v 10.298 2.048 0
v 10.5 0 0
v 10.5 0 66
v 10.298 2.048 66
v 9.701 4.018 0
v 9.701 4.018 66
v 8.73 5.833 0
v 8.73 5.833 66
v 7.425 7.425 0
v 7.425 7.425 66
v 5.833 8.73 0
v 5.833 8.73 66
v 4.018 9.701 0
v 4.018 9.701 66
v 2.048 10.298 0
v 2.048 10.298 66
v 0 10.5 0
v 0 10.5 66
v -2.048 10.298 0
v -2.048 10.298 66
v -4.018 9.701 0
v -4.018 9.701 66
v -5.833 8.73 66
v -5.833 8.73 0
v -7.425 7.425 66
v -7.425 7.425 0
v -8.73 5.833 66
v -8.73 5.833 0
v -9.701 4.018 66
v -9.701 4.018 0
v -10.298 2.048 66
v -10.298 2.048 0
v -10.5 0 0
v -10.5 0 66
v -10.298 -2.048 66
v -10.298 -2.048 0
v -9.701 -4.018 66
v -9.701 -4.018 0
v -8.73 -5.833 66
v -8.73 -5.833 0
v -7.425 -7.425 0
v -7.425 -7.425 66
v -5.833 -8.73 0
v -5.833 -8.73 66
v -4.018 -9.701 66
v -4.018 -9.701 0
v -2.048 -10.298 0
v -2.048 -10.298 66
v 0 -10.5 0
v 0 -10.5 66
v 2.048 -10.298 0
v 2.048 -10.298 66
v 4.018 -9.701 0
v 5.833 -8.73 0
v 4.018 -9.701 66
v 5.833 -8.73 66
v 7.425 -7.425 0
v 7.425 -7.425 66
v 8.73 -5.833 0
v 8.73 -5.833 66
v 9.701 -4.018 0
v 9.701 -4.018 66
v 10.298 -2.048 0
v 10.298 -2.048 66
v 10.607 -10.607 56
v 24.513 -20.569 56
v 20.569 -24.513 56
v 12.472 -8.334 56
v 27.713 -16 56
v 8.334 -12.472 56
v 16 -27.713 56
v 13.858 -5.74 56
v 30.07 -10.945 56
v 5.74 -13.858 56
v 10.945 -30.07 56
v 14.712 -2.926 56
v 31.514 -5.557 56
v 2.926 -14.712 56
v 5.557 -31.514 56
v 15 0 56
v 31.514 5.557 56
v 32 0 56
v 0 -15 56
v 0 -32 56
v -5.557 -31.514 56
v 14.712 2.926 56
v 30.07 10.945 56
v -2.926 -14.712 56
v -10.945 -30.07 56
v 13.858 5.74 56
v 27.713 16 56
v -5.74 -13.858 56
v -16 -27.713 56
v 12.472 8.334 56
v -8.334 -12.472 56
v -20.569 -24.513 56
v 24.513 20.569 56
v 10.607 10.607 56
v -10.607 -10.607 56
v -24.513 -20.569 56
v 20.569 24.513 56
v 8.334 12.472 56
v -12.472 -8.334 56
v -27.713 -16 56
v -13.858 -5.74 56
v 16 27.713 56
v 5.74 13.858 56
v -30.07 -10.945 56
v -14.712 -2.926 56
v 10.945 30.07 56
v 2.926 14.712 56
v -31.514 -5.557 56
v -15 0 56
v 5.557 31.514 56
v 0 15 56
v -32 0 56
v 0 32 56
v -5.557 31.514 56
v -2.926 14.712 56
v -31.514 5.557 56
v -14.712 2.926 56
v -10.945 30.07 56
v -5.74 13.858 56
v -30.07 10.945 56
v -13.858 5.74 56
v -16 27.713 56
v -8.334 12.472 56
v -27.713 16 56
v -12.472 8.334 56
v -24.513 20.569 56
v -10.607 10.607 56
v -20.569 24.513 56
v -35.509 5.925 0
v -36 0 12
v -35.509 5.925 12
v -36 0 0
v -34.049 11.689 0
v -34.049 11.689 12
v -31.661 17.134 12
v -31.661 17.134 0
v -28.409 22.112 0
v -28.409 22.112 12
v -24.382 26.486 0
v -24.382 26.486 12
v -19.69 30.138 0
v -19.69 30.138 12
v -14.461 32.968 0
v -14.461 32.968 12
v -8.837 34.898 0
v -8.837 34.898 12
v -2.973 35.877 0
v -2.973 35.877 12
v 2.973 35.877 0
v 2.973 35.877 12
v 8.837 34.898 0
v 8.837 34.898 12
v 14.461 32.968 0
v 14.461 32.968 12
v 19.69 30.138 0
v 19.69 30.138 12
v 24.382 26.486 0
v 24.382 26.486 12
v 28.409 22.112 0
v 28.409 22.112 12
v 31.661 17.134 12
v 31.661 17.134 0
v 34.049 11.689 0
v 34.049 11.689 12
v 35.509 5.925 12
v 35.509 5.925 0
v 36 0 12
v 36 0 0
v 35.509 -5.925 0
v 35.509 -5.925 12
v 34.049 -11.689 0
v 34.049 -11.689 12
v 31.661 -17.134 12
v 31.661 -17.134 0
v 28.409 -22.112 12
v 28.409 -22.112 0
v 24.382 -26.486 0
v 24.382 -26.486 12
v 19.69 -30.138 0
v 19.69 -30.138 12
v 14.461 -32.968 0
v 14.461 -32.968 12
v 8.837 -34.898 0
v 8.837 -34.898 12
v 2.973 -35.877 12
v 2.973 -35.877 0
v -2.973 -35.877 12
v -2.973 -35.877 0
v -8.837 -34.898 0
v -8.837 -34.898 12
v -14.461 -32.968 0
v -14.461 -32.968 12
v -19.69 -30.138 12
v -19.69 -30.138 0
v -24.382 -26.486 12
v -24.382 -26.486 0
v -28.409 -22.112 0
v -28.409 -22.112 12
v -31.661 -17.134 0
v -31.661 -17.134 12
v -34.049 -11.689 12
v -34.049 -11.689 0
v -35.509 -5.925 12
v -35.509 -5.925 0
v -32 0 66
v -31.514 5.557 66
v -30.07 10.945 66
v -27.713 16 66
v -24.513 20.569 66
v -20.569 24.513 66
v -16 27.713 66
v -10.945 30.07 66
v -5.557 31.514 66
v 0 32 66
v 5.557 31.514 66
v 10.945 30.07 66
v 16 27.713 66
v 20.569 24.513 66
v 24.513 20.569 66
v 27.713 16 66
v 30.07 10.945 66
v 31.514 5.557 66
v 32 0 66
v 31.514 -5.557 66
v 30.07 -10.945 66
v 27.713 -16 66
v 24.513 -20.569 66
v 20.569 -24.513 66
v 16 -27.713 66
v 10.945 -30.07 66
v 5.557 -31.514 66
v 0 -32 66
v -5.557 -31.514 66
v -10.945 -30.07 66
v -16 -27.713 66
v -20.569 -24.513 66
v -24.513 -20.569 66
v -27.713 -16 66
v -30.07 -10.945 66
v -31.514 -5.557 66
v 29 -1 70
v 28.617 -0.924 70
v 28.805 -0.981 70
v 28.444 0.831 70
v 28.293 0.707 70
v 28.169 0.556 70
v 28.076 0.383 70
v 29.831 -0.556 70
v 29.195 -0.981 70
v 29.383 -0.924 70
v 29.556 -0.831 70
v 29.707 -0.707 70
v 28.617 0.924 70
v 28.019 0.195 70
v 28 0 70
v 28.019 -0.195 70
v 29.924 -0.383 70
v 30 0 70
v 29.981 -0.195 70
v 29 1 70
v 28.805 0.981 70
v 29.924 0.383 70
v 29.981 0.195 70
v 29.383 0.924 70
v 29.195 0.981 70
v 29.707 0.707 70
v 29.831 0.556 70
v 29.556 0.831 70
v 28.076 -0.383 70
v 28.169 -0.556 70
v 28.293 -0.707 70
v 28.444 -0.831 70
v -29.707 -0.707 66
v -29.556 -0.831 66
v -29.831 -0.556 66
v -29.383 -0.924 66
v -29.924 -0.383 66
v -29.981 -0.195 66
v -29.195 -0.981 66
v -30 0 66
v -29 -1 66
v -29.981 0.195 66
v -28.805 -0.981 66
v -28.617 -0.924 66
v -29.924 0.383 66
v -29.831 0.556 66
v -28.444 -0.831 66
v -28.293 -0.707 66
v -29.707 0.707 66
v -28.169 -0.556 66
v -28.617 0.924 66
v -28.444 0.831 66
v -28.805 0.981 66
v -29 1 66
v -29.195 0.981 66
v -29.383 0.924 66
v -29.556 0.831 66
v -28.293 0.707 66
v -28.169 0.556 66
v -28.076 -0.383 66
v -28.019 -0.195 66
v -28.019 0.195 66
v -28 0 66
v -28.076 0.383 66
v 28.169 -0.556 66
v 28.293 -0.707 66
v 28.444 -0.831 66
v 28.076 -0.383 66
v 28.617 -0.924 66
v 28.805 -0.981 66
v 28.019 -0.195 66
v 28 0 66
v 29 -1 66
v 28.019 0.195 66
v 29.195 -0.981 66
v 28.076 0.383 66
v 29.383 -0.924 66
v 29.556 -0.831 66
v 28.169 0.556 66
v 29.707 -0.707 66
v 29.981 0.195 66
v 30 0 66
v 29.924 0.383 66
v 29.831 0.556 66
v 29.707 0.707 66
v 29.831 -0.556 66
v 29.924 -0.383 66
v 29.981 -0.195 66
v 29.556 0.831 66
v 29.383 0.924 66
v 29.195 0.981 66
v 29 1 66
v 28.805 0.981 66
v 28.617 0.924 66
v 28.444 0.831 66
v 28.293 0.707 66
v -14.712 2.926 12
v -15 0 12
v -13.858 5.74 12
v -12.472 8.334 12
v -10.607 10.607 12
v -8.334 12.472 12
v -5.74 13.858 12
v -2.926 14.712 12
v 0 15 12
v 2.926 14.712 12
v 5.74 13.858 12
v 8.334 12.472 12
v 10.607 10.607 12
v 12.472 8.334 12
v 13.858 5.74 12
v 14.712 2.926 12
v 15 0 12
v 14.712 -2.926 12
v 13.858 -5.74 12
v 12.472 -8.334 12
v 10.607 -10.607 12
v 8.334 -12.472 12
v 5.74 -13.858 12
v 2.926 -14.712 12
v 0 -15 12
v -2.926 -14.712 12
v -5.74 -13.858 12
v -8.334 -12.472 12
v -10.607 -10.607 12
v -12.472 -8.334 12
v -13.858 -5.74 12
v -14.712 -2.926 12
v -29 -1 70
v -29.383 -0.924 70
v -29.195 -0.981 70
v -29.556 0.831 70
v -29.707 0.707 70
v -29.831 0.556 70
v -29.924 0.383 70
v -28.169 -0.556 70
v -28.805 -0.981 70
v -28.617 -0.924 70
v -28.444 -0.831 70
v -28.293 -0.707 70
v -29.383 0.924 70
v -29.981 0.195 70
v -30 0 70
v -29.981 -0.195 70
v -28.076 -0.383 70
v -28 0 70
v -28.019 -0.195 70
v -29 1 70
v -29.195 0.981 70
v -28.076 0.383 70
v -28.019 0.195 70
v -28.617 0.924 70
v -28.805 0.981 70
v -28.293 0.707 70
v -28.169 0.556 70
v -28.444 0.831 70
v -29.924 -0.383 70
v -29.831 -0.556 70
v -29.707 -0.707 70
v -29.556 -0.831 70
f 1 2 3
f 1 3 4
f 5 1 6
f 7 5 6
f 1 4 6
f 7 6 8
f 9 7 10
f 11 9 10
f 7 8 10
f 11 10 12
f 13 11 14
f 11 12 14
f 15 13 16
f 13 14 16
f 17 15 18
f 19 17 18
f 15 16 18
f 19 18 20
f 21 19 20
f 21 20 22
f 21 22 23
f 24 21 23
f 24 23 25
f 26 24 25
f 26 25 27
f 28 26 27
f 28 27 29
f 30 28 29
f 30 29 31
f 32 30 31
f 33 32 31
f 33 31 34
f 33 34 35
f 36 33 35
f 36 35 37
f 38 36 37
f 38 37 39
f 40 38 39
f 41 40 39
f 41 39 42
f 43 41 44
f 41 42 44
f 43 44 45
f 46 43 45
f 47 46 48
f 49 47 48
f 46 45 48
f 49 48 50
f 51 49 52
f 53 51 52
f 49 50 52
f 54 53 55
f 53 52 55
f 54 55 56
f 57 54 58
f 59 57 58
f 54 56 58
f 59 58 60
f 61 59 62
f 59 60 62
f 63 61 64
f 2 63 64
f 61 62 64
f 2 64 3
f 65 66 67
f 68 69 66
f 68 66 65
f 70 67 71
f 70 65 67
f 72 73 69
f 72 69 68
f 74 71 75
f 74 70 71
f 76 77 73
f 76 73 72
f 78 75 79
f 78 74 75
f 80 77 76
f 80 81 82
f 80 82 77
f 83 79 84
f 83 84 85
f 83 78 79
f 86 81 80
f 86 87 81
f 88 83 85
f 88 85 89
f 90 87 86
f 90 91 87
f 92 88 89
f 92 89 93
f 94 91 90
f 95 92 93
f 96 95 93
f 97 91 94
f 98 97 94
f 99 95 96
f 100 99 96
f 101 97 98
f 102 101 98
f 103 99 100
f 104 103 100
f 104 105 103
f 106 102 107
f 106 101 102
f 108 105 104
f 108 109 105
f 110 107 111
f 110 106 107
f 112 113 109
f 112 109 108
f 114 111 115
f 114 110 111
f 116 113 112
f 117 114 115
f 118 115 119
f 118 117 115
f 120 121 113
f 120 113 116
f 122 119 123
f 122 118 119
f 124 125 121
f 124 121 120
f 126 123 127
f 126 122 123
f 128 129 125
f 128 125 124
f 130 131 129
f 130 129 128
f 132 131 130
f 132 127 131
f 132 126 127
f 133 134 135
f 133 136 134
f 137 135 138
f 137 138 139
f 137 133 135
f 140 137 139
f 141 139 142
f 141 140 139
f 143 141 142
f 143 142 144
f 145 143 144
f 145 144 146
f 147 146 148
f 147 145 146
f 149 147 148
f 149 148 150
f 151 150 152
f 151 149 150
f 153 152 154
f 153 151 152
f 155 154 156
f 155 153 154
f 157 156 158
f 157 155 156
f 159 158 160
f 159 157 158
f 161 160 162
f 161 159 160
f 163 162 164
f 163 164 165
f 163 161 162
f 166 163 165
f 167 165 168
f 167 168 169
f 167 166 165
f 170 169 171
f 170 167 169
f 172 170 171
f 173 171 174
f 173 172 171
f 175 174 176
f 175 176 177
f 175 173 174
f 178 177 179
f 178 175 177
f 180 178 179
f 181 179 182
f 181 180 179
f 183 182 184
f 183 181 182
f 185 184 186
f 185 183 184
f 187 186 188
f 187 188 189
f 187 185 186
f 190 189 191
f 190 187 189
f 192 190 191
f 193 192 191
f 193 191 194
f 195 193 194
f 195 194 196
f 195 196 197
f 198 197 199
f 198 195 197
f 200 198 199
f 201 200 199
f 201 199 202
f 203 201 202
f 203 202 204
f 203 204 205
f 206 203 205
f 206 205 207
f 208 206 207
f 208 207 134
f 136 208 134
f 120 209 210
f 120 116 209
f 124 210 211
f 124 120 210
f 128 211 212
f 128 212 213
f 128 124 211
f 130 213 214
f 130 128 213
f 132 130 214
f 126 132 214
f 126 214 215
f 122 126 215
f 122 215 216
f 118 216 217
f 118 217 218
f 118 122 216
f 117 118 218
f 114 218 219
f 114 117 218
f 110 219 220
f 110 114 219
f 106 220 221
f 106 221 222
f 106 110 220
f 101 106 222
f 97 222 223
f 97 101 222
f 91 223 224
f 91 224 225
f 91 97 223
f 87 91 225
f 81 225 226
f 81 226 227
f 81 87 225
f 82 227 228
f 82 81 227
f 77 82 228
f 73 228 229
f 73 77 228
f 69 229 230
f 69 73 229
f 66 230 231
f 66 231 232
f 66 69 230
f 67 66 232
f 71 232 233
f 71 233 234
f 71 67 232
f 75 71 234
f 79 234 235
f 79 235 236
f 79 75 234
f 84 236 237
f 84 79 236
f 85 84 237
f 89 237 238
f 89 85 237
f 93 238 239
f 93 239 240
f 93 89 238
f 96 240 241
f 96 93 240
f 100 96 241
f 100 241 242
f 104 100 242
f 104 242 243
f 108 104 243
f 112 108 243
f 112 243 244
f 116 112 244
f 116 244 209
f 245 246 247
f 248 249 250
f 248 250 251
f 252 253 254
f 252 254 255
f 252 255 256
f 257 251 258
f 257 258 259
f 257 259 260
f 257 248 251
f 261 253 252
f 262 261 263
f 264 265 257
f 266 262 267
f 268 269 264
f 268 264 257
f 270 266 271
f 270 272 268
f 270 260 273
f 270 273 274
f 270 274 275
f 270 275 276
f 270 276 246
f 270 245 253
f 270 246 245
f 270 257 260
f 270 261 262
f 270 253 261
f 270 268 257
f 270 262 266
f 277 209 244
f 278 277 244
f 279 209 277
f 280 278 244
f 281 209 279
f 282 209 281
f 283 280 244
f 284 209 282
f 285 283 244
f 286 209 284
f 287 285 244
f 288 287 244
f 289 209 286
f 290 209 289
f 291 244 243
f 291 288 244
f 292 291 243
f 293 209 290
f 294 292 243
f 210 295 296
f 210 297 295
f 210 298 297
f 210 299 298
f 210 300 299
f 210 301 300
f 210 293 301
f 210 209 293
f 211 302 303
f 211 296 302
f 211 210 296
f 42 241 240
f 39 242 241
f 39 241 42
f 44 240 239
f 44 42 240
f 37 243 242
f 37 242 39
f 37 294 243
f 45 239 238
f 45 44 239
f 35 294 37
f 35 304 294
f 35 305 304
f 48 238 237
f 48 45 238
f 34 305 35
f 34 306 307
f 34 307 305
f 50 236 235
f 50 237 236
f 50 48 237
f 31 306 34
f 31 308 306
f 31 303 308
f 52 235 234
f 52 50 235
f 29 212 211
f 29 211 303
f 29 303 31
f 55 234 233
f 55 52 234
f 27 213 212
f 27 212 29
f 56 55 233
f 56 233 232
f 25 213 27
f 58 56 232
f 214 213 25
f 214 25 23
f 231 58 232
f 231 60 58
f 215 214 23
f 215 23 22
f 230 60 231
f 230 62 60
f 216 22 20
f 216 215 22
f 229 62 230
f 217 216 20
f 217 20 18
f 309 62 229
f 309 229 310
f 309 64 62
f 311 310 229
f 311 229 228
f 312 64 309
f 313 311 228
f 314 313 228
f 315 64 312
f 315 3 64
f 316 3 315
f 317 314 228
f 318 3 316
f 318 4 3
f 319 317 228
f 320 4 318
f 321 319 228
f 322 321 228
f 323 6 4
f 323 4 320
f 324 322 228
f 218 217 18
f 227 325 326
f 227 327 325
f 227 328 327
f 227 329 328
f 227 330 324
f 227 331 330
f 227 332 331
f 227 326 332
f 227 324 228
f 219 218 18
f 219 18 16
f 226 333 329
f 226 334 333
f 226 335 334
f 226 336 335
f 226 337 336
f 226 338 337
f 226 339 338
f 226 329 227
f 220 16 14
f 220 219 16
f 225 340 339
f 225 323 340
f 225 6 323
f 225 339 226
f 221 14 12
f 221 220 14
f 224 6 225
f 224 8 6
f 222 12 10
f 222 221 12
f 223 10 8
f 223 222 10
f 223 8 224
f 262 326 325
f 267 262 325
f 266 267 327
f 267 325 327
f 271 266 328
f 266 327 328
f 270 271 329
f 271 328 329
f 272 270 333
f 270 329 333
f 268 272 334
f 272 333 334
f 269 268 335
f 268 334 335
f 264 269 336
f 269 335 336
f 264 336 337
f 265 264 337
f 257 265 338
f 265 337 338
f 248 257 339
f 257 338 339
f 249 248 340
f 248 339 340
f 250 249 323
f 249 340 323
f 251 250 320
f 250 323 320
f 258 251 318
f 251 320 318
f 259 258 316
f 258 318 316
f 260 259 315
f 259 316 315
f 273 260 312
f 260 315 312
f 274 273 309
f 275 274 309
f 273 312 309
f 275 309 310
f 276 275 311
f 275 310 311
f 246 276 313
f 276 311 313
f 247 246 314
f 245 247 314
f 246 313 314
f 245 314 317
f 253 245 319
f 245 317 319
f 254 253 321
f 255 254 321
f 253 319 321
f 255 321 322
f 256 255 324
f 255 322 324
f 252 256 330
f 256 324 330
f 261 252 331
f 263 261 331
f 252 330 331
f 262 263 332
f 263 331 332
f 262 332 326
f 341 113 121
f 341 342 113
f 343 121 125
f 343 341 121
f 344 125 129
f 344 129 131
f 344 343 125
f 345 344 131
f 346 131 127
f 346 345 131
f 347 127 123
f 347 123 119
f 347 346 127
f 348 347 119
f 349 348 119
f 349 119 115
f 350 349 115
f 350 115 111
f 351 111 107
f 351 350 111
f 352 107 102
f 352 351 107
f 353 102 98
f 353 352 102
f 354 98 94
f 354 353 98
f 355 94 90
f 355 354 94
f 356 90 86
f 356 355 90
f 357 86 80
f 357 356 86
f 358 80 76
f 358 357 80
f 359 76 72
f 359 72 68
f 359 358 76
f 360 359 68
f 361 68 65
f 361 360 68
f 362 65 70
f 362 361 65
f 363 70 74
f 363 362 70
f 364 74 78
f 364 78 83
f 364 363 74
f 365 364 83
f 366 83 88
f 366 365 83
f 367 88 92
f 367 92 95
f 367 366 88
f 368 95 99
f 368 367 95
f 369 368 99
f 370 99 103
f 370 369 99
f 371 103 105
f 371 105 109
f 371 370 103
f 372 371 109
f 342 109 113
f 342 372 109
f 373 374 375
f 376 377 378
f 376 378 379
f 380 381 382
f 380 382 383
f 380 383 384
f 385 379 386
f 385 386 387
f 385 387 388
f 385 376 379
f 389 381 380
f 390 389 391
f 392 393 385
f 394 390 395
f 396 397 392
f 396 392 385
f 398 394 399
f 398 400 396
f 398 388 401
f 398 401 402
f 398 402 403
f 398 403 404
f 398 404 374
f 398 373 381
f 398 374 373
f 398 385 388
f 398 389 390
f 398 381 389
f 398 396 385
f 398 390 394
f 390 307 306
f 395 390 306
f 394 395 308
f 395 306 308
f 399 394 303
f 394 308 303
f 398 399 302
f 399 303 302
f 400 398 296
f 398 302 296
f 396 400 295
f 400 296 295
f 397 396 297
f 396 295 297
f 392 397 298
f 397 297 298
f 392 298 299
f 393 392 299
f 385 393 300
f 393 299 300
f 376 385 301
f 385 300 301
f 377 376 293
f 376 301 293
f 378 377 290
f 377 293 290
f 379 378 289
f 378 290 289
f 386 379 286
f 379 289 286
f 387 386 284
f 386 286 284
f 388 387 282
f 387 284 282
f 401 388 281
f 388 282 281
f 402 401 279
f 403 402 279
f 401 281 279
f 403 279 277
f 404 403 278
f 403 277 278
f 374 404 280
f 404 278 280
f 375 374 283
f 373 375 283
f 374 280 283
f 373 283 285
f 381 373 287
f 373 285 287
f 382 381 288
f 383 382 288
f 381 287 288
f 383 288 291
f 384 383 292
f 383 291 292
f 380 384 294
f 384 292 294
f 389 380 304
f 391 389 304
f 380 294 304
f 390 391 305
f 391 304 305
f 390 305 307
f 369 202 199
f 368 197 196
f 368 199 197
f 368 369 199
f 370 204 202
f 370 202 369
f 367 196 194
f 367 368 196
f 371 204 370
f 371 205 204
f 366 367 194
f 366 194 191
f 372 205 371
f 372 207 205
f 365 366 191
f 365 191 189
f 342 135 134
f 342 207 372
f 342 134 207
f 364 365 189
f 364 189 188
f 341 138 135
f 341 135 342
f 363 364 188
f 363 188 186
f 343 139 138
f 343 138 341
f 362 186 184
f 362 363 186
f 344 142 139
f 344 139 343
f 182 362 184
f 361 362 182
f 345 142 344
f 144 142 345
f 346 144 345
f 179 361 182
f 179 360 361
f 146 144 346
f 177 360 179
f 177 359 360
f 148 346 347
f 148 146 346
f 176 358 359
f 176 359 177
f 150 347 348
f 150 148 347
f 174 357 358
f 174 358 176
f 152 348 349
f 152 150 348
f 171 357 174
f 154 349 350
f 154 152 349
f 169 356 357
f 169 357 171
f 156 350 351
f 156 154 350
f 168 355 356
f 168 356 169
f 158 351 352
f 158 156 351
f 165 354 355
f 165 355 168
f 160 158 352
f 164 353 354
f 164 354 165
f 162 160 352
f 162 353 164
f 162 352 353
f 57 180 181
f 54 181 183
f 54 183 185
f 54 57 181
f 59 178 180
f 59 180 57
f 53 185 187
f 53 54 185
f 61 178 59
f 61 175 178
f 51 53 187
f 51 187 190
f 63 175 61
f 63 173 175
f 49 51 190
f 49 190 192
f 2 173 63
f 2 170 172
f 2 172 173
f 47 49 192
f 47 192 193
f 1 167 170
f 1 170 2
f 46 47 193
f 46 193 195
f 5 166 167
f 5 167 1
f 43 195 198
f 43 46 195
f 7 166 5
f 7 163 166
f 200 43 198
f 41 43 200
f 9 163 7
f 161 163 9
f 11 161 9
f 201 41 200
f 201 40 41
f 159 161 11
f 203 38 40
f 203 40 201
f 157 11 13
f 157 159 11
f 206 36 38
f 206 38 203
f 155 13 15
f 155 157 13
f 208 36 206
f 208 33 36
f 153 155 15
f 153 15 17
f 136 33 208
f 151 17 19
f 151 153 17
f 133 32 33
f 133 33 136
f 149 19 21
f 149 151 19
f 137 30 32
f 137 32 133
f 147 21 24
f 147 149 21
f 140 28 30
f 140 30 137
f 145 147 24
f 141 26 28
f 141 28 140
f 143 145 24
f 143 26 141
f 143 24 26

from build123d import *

# Parameters (mm, degrees)
F2_R     = 10.5
F3_DEPTH = 66.001
F4_R     = 1
F5_DEPTH = 4


with BuildPart() as f1:
    # F0 (on Front) → F1 (revolve)
    with BuildSketch(Plane.XZ):
        Polygon((-36, 0), (0, 0), (0, 66), (-32, 66), (-32, 56), (-15, 56), (-15, 12), (-36, 12), align=None)
    revolve(axis=Axis((0, 0, 33), (0, 0, -1)))

    # F2 (on face) → F3 (cut, through all)
    with BuildSketch(Plane.XY.offset(66)):
        Circle(F2_R)
    extrude(amount=-F3_DEPTH, mode=Mode.SUBTRACT)

    # F4 (on face) → F5 (join)
    with BuildSketch(Plane.XY.offset(66)):
        with Locations((-29, 0)):
            Circle(F4_R)
        with Locations((29, 0)):
            Circle(F4_R)
    extrude(amount=F5_DEPTH)


solid = f1.part
